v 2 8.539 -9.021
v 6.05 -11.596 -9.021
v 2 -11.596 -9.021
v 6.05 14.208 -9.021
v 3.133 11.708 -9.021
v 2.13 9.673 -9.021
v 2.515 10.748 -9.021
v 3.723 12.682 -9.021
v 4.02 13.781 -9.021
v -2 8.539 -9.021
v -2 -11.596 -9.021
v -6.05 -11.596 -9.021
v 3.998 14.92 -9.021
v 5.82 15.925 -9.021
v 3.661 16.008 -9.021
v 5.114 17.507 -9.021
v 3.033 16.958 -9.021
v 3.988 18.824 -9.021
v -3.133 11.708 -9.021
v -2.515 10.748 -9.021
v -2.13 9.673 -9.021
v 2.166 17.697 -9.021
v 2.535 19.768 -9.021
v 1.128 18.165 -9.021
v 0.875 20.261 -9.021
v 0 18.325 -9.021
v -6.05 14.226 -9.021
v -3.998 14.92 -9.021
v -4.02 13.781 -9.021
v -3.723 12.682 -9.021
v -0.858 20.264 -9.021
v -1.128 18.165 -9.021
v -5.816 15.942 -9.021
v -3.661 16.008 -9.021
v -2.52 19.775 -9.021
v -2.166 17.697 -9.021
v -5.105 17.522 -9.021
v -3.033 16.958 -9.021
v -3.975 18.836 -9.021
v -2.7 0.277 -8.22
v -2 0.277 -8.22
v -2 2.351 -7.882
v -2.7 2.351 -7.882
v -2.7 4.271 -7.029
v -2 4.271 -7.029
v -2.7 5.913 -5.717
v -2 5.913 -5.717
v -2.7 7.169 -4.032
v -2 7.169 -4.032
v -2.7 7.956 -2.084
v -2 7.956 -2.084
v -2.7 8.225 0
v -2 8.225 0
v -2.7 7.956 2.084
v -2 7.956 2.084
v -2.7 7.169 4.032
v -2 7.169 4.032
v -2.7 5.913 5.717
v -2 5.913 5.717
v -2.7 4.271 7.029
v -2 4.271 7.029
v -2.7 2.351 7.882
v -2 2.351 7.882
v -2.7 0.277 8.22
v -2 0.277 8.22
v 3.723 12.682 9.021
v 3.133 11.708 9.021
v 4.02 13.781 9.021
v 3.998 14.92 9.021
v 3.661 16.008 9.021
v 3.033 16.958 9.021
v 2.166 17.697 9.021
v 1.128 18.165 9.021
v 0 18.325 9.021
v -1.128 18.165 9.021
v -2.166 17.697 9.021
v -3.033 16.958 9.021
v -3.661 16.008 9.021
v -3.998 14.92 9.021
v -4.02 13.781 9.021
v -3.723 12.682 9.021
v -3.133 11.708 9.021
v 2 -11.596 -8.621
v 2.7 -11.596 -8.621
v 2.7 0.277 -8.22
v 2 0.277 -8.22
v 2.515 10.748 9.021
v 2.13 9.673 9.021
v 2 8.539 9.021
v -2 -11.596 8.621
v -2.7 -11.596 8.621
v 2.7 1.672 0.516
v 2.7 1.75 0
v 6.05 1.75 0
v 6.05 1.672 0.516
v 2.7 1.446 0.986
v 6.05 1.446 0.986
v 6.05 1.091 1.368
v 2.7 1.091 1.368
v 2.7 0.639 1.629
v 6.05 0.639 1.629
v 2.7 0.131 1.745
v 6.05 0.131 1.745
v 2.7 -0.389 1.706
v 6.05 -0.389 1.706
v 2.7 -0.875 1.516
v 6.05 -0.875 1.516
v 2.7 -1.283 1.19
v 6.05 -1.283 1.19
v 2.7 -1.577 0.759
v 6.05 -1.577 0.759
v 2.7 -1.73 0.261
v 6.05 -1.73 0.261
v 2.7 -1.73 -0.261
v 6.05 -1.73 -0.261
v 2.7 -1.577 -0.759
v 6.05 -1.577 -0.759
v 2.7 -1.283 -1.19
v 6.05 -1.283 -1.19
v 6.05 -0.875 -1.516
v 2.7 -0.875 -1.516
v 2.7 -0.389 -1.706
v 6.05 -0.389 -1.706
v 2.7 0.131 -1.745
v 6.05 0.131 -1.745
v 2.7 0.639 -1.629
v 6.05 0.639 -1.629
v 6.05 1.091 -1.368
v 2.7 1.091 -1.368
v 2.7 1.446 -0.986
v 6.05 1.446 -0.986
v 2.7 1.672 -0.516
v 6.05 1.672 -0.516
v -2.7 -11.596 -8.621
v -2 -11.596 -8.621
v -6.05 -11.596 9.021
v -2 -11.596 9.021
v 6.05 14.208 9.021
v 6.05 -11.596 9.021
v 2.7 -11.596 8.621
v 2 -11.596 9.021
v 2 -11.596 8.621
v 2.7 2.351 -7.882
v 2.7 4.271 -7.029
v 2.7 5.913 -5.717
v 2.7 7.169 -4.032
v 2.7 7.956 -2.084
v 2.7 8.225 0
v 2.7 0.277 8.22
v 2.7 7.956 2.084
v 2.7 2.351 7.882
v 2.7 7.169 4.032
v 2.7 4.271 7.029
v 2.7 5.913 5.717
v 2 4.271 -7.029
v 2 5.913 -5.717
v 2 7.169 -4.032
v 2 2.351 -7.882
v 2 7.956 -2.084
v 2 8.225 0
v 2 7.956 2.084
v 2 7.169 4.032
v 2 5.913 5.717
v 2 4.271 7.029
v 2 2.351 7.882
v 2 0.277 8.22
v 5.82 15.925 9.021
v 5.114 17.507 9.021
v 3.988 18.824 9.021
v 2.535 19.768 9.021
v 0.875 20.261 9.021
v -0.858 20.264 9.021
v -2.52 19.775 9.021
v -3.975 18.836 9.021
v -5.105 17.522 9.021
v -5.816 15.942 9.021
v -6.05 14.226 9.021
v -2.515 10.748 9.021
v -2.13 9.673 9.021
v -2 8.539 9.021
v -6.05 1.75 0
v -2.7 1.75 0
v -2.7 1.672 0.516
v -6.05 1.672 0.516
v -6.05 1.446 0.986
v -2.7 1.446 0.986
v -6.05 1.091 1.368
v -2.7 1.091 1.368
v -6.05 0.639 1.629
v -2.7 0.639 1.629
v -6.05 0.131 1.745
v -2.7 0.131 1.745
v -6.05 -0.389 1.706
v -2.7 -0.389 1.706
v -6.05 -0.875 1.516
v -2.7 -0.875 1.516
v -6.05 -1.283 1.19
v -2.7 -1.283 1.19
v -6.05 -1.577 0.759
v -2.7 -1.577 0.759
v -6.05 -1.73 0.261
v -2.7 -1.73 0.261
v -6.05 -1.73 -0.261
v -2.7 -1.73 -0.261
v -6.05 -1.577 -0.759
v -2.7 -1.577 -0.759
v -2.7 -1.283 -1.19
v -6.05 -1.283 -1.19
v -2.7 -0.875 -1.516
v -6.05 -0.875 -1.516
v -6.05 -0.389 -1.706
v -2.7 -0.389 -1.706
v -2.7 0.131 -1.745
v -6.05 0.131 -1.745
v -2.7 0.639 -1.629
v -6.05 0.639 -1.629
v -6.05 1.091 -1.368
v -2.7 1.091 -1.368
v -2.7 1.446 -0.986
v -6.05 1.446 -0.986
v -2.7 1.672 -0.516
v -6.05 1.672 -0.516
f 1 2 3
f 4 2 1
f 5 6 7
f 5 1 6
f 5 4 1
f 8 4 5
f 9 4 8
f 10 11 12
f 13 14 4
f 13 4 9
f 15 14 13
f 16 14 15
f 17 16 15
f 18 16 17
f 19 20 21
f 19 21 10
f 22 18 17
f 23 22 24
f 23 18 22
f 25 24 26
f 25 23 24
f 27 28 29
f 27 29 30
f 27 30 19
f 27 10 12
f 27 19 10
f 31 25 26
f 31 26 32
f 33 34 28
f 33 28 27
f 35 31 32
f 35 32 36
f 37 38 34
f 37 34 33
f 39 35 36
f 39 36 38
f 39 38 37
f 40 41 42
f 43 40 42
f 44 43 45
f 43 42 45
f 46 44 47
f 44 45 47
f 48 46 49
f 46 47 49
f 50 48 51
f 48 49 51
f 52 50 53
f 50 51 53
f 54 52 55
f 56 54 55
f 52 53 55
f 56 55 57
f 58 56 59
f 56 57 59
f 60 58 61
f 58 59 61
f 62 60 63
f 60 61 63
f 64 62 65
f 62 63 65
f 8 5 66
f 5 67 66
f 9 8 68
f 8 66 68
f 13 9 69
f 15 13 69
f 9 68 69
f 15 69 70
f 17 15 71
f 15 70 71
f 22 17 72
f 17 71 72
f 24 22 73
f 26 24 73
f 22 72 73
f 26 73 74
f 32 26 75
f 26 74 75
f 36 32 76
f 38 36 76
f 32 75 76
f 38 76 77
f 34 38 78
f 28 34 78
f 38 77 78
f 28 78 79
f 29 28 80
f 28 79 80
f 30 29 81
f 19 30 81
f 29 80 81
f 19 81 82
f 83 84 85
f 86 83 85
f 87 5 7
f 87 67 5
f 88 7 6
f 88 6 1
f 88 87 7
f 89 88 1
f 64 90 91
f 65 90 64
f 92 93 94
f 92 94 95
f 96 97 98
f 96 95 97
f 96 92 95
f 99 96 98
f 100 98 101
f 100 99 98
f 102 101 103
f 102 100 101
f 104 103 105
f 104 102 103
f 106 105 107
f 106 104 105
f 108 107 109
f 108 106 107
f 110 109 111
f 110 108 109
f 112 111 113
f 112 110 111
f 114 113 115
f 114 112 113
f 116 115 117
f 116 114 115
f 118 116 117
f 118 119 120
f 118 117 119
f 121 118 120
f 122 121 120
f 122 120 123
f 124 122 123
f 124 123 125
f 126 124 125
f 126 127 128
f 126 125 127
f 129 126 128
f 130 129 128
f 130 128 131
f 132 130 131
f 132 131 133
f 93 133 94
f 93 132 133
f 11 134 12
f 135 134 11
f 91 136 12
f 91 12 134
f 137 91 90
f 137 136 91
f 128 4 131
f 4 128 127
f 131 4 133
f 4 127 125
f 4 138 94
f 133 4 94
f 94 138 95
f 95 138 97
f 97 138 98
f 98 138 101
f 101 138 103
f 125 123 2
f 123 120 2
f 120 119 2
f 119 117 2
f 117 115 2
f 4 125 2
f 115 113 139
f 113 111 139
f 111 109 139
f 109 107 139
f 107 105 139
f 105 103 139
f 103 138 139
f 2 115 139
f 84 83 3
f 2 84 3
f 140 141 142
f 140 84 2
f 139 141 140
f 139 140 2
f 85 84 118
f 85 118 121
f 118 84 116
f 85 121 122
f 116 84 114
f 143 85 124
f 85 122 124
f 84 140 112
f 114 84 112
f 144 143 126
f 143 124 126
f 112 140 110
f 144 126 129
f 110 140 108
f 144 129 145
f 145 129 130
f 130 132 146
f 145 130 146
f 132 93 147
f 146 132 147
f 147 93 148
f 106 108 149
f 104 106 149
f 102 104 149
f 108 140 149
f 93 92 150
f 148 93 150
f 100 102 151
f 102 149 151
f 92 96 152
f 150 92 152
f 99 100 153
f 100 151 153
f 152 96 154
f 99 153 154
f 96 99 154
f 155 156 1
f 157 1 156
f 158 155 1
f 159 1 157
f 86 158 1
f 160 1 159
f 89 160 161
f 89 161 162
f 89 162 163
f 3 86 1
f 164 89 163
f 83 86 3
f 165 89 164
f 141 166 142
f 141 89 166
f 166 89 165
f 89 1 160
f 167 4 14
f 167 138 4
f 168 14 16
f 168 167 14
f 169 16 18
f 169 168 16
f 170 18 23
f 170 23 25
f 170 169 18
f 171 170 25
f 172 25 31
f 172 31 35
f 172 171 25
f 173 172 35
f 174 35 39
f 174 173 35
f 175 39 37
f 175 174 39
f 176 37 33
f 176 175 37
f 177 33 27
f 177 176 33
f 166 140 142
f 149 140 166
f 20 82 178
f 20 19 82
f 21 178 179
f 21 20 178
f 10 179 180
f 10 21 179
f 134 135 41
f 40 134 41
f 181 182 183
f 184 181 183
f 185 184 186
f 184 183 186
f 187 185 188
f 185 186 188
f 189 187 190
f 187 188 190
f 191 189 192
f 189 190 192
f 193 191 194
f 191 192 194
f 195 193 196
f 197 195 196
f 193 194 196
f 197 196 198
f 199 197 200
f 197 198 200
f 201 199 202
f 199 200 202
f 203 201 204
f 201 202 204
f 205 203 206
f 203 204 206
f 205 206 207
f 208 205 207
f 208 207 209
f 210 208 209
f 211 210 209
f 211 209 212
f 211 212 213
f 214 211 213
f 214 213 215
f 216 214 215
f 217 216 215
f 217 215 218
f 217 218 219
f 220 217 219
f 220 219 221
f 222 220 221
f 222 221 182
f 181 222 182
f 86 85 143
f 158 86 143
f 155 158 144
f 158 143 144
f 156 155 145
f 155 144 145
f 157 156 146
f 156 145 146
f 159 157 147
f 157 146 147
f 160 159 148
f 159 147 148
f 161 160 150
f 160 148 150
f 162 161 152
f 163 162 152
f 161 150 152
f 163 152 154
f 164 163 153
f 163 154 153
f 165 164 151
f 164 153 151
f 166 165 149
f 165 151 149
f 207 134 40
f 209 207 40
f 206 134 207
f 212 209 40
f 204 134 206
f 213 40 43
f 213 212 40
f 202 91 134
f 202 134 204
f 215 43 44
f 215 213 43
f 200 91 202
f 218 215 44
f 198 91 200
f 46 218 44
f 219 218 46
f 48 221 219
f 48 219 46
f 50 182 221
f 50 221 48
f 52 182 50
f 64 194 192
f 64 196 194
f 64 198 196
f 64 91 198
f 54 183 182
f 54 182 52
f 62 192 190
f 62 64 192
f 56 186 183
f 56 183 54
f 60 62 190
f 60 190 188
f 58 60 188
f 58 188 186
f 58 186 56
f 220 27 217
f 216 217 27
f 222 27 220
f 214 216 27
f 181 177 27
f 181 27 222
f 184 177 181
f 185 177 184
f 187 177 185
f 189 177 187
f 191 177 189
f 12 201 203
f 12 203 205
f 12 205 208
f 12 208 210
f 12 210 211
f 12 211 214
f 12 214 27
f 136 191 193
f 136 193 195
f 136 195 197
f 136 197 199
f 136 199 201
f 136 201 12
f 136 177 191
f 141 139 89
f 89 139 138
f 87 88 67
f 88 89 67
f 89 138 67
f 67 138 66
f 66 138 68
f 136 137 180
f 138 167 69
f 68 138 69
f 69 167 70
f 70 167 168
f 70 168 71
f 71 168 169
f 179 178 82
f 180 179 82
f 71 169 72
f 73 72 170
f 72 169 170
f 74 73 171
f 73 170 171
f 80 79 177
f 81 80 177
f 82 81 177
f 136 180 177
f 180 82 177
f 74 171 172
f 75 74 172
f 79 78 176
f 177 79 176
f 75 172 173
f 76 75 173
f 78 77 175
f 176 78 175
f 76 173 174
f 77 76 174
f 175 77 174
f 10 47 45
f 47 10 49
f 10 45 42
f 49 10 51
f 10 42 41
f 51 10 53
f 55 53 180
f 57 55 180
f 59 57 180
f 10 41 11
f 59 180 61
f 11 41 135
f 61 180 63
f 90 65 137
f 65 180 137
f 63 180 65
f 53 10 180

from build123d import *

# Parameters (mm, degrees)
PAD_DEPTH            = 9.020639
POCKET_DEPTH         = 2.7
SKETCH003_R          = 1.75
POCKET001_DEPTH      = 6.051
POCKET001_DEPTH_BACK = -6.051
FILLET_R             = 5


with BuildPart() as part:
    # Sketch001 → Pad (new body, symmetric)
    with BuildSketch(Plane.XY):
        with BuildLine():
            ThreePointArc((2, 10.753118), (0, 18.324836), (-2, 10.753118))
            Line((-2, 10.753118), (-2, -11.595564))
            Line((-6.0498, -11.595564), (-2, -11.595564))
            Line((-6.0498, 14.225598), (-6.0498, -11.595564))
            ThreePointArc((6.049634, 14.208289), (0.008655, 20.32483), (-6.0498, 14.225598))
            Line((6.049634, 14.208289), (6.049634, -11.595564))
            Line((2, -11.595564), (6.049634, -11.595564))
            Line((2, 10.753118), (2, -11.595564))
        make_face()
    extrude(amount=PAD_DEPTH, both=True)

    # Sketch002 → Pocket (cut, symmetric)
    with BuildSketch(Plane.YZ):
        with BuildLine():
            ThreePointArc((0.277273, -8.220161), (8.224836, 1e-06), (0.277271, 8.220161))
            Line((-11.595564, 8.620639), (0.277271, 8.220161))
            Line((-11.595564, 8.620639), (-11.595564, -8.620639))
            Line((-11.595564, -8.620639), (0.277273, -8.220161))
        make_face()
    extrude(amount=POCKET_DEPTH, both=True, mode=Mode.SUBTRACT)

    # Sketch003 → Pocket001 (cut, two sides)
    with BuildSketch(Plane.YZ) as pocket001_sk:
        Circle(SKETCH003_R)
    extrude(amount=-POCKET001_DEPTH, mode=Mode.SUBTRACT)
    extrude(pocket001_sk.sketch, amount=-POCKET001_DEPTH_BACK, mode=Mode.SUBTRACT)

    # Fillet
    fillet_edges = [part.edges().sort_by_distance(p)[0] for p in [
        (2, 10.753118, 0),
        (-2, 10.753118, 0),
    ]]
    fillet(fillet_edges, radius=FILLET_R)


solid = part.part
